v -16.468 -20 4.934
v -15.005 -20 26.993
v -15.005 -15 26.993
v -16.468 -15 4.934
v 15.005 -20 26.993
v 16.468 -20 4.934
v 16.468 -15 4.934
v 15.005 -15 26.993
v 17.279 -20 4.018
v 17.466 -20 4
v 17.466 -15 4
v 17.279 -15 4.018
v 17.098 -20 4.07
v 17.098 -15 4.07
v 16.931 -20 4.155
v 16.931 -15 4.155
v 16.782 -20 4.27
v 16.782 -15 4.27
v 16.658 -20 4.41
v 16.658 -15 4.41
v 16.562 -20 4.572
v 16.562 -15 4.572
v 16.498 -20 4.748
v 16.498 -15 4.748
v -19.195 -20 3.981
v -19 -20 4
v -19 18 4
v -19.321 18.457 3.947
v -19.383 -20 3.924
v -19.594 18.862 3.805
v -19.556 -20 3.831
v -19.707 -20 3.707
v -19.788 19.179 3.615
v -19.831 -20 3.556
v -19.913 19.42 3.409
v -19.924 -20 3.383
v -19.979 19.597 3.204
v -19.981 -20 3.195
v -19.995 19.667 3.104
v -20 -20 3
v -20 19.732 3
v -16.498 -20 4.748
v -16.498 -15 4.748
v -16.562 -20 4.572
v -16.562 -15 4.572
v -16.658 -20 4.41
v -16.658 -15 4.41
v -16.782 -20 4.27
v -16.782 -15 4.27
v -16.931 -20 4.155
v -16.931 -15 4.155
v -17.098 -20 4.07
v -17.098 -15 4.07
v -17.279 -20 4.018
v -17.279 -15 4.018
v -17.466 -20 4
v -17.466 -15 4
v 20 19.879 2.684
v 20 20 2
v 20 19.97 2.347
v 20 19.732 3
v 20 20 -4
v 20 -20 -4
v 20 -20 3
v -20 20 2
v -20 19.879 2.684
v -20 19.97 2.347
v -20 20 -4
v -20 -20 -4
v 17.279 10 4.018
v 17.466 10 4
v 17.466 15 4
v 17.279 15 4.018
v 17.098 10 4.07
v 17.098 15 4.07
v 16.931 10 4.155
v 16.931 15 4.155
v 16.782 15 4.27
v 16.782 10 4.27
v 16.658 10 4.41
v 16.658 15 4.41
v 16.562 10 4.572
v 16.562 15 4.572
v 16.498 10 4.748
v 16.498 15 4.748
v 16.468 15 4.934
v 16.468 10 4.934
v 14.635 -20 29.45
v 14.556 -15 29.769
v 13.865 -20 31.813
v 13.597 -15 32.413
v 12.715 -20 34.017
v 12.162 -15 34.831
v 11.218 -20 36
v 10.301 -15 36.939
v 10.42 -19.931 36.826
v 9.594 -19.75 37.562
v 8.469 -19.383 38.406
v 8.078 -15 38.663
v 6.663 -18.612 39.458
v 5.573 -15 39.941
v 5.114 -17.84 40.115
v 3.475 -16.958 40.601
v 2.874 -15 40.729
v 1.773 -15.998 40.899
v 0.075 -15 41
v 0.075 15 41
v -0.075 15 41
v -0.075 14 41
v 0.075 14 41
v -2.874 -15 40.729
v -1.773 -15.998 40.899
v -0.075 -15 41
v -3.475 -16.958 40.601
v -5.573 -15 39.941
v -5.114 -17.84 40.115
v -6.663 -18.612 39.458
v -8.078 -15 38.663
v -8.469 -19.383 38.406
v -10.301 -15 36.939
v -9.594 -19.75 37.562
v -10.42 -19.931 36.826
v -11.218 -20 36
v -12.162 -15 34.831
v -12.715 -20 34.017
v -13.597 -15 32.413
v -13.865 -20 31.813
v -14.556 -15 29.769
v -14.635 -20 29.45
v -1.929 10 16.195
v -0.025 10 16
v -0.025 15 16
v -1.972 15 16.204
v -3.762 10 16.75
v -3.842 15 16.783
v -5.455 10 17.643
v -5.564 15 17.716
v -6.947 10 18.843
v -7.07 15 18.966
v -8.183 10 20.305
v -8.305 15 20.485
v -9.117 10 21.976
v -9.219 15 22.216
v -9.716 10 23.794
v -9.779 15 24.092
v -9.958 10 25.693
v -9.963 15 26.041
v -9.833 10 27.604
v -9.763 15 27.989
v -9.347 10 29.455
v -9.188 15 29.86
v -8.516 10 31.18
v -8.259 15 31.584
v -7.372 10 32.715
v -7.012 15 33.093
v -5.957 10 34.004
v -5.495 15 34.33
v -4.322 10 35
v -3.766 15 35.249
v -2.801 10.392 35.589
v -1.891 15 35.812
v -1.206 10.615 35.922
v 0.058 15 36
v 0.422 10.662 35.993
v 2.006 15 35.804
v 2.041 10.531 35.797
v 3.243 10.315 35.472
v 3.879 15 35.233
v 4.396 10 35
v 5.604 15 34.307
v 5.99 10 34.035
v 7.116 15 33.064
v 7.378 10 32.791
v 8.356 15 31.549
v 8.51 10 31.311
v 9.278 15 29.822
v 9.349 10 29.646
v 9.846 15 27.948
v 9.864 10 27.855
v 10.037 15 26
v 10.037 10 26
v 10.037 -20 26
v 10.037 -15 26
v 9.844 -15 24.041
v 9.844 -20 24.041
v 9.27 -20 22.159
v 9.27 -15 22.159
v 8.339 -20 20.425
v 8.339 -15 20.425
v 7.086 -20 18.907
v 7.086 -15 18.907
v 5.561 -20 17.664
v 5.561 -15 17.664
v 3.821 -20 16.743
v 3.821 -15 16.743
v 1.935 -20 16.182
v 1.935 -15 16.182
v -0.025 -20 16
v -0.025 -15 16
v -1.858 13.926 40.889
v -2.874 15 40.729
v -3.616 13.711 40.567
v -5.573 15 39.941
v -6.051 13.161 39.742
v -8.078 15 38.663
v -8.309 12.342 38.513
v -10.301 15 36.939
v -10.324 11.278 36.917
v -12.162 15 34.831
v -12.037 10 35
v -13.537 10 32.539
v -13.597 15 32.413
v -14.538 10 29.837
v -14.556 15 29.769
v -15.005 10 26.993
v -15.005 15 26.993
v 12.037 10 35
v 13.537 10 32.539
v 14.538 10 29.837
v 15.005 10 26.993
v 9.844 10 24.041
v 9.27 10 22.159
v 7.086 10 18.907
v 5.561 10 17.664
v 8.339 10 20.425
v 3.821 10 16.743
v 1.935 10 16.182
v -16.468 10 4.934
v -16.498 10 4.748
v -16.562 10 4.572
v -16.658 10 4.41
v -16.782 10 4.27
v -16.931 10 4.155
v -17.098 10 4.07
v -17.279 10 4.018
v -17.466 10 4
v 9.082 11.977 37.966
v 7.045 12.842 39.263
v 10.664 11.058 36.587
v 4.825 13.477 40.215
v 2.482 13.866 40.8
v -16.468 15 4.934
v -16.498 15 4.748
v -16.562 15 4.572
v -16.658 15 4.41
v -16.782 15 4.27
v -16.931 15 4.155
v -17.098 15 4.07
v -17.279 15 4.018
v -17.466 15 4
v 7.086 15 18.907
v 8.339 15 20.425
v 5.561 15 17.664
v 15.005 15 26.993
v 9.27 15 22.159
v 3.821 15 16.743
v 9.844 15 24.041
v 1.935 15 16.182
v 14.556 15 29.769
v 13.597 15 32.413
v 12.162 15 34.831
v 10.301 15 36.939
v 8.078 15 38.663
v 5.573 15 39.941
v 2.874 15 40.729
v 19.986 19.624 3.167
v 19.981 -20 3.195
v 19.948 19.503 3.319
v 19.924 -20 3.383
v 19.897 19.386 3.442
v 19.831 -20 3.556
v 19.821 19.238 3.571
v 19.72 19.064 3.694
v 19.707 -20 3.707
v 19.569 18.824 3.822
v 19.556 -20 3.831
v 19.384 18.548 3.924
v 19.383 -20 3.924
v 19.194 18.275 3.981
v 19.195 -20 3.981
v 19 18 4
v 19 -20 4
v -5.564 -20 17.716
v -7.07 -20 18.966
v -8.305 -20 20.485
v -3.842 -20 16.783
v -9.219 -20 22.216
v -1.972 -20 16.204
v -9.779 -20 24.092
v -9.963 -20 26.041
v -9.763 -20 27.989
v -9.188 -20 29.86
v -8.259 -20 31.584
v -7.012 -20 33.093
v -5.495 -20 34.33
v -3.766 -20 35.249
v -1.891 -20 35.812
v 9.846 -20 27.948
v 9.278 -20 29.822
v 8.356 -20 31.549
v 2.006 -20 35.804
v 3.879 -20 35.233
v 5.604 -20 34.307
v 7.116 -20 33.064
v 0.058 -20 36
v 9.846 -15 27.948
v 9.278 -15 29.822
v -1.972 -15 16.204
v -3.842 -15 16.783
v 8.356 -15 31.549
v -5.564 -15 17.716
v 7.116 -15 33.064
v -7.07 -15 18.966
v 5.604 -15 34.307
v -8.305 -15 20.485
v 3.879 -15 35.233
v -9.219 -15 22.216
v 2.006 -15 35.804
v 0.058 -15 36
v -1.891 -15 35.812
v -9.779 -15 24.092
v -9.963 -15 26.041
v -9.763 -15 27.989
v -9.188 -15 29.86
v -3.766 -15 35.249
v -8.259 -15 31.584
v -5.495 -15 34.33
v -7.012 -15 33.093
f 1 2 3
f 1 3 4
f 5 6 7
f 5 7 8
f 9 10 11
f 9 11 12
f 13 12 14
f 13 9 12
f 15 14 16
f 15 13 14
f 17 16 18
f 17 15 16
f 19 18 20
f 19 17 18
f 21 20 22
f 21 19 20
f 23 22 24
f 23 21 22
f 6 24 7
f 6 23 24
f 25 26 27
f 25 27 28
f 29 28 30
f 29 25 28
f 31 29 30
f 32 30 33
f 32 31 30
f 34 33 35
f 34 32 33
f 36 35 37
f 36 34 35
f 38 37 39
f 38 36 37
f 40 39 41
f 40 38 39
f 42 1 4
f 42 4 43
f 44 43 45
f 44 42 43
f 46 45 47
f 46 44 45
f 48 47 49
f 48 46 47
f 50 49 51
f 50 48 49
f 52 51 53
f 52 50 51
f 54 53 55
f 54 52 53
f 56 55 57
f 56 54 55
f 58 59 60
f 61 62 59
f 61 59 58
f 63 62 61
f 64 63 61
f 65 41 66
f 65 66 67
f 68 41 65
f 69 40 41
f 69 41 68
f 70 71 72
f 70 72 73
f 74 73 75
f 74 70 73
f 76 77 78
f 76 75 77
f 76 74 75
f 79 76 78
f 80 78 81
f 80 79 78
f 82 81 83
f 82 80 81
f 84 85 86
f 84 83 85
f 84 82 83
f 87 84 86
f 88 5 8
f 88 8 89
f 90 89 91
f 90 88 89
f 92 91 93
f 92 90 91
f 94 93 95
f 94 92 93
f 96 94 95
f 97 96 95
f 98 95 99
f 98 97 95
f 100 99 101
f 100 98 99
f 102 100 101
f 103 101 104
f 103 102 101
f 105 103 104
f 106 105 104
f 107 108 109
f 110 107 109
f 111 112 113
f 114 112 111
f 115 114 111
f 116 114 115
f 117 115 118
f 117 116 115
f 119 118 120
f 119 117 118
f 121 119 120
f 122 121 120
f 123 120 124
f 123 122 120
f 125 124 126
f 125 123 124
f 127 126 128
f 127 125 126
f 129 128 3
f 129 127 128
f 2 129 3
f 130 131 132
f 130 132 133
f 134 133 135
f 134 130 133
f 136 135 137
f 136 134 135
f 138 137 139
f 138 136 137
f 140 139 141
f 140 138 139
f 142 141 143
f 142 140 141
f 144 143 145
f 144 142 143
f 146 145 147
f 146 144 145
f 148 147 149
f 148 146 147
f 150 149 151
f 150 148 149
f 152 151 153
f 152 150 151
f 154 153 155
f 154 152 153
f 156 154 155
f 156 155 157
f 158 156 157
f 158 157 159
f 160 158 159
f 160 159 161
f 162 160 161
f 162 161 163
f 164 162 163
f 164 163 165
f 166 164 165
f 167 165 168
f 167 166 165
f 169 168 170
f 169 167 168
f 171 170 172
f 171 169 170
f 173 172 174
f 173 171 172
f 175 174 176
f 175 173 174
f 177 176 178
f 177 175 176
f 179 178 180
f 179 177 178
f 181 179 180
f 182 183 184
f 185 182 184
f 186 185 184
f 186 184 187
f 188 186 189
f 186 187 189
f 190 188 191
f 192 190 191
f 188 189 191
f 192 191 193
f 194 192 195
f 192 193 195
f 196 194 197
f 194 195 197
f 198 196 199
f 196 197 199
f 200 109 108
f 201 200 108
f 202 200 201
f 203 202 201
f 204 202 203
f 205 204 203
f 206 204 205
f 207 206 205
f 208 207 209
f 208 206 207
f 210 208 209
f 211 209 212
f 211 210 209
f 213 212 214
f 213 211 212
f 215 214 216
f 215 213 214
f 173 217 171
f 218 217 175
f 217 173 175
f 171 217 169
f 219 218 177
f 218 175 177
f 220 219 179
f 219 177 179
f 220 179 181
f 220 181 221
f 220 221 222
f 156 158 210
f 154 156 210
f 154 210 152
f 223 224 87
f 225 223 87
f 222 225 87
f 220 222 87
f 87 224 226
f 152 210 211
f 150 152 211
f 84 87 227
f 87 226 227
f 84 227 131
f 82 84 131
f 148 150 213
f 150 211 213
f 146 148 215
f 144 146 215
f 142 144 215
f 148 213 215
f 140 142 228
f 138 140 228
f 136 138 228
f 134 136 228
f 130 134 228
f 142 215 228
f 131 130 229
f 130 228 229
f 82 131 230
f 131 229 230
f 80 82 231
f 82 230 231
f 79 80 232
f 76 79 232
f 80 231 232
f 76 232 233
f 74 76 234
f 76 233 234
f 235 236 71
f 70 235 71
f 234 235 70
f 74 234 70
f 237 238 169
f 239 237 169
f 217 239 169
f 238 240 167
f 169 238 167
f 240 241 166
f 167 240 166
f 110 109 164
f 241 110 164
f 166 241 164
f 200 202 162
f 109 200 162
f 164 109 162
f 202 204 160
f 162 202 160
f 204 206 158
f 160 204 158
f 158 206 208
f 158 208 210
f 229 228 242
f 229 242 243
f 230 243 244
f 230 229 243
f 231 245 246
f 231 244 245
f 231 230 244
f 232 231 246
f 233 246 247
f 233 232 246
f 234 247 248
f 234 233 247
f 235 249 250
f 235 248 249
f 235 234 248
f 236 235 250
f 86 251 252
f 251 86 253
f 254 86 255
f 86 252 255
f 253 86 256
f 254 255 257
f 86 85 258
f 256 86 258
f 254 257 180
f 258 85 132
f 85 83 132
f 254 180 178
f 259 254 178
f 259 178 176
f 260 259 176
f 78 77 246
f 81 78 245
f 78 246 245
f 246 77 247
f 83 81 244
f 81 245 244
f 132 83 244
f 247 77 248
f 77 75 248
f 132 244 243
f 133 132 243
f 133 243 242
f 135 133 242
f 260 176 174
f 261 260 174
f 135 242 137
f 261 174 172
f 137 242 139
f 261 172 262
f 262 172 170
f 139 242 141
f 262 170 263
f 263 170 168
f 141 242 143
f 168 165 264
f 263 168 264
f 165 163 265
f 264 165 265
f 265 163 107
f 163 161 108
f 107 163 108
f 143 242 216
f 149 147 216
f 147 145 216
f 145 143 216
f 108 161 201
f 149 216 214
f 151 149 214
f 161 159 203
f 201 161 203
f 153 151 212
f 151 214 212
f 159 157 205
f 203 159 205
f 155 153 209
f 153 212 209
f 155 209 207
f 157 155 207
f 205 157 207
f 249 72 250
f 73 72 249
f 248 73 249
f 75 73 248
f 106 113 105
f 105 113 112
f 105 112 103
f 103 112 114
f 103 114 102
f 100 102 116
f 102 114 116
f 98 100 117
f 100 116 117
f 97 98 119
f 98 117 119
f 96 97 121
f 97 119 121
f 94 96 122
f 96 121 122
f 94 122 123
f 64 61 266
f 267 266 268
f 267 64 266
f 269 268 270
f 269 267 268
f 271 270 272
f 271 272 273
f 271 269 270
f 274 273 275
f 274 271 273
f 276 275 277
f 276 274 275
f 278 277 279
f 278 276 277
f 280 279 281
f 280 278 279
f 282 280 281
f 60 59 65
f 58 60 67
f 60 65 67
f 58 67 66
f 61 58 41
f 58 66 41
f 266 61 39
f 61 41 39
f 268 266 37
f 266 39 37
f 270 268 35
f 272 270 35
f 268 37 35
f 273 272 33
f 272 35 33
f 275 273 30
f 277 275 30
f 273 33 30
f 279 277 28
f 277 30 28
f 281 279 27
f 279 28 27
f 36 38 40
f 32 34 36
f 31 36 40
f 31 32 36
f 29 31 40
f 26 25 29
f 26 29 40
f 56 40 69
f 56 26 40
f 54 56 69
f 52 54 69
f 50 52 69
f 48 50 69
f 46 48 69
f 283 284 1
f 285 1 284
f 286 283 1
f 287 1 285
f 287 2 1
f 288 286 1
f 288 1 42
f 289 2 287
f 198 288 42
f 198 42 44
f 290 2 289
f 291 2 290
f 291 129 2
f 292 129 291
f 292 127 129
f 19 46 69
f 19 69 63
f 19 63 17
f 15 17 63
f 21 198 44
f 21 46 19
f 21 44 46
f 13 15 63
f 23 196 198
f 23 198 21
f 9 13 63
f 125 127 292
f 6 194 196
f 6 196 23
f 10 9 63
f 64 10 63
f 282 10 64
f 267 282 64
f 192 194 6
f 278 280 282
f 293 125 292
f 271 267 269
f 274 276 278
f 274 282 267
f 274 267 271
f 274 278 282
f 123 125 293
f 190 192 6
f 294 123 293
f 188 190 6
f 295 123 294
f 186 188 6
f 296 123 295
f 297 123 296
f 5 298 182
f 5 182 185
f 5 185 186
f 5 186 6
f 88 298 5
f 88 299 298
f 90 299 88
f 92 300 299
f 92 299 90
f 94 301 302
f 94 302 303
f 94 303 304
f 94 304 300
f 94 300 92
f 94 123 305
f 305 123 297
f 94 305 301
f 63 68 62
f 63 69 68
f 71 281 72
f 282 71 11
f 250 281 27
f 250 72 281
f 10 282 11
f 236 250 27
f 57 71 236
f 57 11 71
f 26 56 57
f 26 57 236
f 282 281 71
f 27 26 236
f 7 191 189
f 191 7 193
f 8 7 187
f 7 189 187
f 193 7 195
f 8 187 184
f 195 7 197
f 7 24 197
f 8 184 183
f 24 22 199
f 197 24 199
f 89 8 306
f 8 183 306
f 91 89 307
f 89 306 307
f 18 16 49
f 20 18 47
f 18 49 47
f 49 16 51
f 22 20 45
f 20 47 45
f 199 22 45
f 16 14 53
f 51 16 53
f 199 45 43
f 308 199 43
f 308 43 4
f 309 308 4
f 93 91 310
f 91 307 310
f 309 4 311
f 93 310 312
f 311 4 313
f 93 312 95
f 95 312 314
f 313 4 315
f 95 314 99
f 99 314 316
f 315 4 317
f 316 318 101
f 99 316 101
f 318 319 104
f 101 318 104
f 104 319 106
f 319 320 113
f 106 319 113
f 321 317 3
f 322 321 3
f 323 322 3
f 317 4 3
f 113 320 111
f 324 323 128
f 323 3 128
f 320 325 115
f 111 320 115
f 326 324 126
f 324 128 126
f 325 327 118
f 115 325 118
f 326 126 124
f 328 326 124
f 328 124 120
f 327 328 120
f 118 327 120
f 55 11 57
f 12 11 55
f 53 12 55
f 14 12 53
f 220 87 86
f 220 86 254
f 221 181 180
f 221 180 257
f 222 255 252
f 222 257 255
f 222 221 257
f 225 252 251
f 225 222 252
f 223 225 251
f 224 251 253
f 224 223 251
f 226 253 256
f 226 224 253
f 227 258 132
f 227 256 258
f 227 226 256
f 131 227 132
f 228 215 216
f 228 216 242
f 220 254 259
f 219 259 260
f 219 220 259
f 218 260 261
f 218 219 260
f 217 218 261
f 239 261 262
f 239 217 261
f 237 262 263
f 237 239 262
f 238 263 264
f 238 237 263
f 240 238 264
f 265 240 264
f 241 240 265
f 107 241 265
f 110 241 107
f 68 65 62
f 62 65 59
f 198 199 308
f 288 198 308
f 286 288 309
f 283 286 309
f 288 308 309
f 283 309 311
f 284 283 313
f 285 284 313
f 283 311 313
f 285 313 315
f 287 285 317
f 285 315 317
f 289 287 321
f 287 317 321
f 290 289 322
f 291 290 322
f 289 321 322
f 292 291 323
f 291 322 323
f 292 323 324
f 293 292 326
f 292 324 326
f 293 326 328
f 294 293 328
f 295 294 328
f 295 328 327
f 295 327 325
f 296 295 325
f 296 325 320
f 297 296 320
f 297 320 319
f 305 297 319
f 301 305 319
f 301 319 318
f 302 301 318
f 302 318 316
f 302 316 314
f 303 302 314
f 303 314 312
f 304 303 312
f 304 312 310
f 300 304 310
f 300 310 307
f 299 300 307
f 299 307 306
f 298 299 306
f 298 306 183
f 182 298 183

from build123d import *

# Parameters (mm, degrees)
F2_DEPTH      = 20
F2_DEPTH_BACK = 20
F3_START      = -25.4
F3_DEPTH      = 59.436


with BuildPart() as f2:
    # F0 (on Front) → F2 (new body, two sides)
    with BuildSketch(Plane.XZ) as f2_sk:
        with BuildLine():
            Line((0, -4), (20, -4))
            Line((20, -4), (20, 3))
            ThreePointArc((20, 3), (19.7071067812, 3.7071067812), (19, 4))
            Line((19, 4), (17.4655668493, 4))
            ThreePointArc((17.4655668493, 4), (16.7822617025, 4.269867083), (16.4677596893, 4.9338118471))
            Line((16.4677596893, 4.9338118471), (15.0045070864, 26.9928036795))
            ThreePointArc((15.0045070864, 26.9928036795), (10.2733190387, 36.9647668796), (0, 41))
            ThreePointArc((0, 41), (-10.2733190387, 36.9647668796), (-15.0045070864, 26.9928036795))
            Line((-15.0045070864, 26.9928036795), (-16.4677596893, 4.9338118471))
            ThreePointArc((-16.4677596893, 4.9338118471), (-16.7822617025, 4.269867083), (-17.4655668493, 4))
            Line((-17.4655668493, 4), (-19, 4))
            ThreePointArc((-19, 4), (-19.7071067812, 3.7071067812), (-20, 3))
            Line((-20, 3), (-20, -4))
            Line((-20, -4), (0, -4))
        make_face()
        with BuildLine():
            ThreePointArc((10.0373301632, 25.9999767743), (7.0863665619, 18.90694598), (-0.0248870067, 16.000170325))
            ThreePointArc((-0.0248870067, 16.000170325), (-7.0117062355, 33.0930075686), (10.0373301632, 25.9999767743))
        make_face(mode=Mode.SUBTRACT)
    extrude(amount=F2_DEPTH)
    extrude(f2_sk.sketch, amount=-F2_DEPTH_BACK)

    # F1 (on Right) → F3 (intersect)
    with BuildSketch(Plane.YZ.offset(F3_START)):
        with BuildLine():
            ThreePointArc((20, 2), (19.4142135624, 3.4142135624), (18, 4))
            Line((18, 4), (15, 4))
            Line((15, 4), (14, 4))
            Line((14, 4), (10, 4))
            Line((10, 4), (-15, 4))
            Line((-15, 4), (-20, 4))
            Line((-20, 4), (-20, -4))
            Line((-20, -4), (20, -4))
            Line((20, -4), (20, 2))
        make_face()
        Polygon((14, 4), (15, 4), (15, 41), (14.5, 41), (14, 41), (10, 35), (10, 4), align=None)
        with BuildLine():
            Line((-20, 4), (-15, 4))
            Line((-15, 4), (-15, 41))
            ThreePointArc((-15, 41), (-18.5355339059, 39.5355339059), (-20, 36))
            Line((-20, 36), (-20, 4))
        make_face()
    extrude(amount=F3_DEPTH, mode=Mode.INTERSECT)


solid = f2.part
